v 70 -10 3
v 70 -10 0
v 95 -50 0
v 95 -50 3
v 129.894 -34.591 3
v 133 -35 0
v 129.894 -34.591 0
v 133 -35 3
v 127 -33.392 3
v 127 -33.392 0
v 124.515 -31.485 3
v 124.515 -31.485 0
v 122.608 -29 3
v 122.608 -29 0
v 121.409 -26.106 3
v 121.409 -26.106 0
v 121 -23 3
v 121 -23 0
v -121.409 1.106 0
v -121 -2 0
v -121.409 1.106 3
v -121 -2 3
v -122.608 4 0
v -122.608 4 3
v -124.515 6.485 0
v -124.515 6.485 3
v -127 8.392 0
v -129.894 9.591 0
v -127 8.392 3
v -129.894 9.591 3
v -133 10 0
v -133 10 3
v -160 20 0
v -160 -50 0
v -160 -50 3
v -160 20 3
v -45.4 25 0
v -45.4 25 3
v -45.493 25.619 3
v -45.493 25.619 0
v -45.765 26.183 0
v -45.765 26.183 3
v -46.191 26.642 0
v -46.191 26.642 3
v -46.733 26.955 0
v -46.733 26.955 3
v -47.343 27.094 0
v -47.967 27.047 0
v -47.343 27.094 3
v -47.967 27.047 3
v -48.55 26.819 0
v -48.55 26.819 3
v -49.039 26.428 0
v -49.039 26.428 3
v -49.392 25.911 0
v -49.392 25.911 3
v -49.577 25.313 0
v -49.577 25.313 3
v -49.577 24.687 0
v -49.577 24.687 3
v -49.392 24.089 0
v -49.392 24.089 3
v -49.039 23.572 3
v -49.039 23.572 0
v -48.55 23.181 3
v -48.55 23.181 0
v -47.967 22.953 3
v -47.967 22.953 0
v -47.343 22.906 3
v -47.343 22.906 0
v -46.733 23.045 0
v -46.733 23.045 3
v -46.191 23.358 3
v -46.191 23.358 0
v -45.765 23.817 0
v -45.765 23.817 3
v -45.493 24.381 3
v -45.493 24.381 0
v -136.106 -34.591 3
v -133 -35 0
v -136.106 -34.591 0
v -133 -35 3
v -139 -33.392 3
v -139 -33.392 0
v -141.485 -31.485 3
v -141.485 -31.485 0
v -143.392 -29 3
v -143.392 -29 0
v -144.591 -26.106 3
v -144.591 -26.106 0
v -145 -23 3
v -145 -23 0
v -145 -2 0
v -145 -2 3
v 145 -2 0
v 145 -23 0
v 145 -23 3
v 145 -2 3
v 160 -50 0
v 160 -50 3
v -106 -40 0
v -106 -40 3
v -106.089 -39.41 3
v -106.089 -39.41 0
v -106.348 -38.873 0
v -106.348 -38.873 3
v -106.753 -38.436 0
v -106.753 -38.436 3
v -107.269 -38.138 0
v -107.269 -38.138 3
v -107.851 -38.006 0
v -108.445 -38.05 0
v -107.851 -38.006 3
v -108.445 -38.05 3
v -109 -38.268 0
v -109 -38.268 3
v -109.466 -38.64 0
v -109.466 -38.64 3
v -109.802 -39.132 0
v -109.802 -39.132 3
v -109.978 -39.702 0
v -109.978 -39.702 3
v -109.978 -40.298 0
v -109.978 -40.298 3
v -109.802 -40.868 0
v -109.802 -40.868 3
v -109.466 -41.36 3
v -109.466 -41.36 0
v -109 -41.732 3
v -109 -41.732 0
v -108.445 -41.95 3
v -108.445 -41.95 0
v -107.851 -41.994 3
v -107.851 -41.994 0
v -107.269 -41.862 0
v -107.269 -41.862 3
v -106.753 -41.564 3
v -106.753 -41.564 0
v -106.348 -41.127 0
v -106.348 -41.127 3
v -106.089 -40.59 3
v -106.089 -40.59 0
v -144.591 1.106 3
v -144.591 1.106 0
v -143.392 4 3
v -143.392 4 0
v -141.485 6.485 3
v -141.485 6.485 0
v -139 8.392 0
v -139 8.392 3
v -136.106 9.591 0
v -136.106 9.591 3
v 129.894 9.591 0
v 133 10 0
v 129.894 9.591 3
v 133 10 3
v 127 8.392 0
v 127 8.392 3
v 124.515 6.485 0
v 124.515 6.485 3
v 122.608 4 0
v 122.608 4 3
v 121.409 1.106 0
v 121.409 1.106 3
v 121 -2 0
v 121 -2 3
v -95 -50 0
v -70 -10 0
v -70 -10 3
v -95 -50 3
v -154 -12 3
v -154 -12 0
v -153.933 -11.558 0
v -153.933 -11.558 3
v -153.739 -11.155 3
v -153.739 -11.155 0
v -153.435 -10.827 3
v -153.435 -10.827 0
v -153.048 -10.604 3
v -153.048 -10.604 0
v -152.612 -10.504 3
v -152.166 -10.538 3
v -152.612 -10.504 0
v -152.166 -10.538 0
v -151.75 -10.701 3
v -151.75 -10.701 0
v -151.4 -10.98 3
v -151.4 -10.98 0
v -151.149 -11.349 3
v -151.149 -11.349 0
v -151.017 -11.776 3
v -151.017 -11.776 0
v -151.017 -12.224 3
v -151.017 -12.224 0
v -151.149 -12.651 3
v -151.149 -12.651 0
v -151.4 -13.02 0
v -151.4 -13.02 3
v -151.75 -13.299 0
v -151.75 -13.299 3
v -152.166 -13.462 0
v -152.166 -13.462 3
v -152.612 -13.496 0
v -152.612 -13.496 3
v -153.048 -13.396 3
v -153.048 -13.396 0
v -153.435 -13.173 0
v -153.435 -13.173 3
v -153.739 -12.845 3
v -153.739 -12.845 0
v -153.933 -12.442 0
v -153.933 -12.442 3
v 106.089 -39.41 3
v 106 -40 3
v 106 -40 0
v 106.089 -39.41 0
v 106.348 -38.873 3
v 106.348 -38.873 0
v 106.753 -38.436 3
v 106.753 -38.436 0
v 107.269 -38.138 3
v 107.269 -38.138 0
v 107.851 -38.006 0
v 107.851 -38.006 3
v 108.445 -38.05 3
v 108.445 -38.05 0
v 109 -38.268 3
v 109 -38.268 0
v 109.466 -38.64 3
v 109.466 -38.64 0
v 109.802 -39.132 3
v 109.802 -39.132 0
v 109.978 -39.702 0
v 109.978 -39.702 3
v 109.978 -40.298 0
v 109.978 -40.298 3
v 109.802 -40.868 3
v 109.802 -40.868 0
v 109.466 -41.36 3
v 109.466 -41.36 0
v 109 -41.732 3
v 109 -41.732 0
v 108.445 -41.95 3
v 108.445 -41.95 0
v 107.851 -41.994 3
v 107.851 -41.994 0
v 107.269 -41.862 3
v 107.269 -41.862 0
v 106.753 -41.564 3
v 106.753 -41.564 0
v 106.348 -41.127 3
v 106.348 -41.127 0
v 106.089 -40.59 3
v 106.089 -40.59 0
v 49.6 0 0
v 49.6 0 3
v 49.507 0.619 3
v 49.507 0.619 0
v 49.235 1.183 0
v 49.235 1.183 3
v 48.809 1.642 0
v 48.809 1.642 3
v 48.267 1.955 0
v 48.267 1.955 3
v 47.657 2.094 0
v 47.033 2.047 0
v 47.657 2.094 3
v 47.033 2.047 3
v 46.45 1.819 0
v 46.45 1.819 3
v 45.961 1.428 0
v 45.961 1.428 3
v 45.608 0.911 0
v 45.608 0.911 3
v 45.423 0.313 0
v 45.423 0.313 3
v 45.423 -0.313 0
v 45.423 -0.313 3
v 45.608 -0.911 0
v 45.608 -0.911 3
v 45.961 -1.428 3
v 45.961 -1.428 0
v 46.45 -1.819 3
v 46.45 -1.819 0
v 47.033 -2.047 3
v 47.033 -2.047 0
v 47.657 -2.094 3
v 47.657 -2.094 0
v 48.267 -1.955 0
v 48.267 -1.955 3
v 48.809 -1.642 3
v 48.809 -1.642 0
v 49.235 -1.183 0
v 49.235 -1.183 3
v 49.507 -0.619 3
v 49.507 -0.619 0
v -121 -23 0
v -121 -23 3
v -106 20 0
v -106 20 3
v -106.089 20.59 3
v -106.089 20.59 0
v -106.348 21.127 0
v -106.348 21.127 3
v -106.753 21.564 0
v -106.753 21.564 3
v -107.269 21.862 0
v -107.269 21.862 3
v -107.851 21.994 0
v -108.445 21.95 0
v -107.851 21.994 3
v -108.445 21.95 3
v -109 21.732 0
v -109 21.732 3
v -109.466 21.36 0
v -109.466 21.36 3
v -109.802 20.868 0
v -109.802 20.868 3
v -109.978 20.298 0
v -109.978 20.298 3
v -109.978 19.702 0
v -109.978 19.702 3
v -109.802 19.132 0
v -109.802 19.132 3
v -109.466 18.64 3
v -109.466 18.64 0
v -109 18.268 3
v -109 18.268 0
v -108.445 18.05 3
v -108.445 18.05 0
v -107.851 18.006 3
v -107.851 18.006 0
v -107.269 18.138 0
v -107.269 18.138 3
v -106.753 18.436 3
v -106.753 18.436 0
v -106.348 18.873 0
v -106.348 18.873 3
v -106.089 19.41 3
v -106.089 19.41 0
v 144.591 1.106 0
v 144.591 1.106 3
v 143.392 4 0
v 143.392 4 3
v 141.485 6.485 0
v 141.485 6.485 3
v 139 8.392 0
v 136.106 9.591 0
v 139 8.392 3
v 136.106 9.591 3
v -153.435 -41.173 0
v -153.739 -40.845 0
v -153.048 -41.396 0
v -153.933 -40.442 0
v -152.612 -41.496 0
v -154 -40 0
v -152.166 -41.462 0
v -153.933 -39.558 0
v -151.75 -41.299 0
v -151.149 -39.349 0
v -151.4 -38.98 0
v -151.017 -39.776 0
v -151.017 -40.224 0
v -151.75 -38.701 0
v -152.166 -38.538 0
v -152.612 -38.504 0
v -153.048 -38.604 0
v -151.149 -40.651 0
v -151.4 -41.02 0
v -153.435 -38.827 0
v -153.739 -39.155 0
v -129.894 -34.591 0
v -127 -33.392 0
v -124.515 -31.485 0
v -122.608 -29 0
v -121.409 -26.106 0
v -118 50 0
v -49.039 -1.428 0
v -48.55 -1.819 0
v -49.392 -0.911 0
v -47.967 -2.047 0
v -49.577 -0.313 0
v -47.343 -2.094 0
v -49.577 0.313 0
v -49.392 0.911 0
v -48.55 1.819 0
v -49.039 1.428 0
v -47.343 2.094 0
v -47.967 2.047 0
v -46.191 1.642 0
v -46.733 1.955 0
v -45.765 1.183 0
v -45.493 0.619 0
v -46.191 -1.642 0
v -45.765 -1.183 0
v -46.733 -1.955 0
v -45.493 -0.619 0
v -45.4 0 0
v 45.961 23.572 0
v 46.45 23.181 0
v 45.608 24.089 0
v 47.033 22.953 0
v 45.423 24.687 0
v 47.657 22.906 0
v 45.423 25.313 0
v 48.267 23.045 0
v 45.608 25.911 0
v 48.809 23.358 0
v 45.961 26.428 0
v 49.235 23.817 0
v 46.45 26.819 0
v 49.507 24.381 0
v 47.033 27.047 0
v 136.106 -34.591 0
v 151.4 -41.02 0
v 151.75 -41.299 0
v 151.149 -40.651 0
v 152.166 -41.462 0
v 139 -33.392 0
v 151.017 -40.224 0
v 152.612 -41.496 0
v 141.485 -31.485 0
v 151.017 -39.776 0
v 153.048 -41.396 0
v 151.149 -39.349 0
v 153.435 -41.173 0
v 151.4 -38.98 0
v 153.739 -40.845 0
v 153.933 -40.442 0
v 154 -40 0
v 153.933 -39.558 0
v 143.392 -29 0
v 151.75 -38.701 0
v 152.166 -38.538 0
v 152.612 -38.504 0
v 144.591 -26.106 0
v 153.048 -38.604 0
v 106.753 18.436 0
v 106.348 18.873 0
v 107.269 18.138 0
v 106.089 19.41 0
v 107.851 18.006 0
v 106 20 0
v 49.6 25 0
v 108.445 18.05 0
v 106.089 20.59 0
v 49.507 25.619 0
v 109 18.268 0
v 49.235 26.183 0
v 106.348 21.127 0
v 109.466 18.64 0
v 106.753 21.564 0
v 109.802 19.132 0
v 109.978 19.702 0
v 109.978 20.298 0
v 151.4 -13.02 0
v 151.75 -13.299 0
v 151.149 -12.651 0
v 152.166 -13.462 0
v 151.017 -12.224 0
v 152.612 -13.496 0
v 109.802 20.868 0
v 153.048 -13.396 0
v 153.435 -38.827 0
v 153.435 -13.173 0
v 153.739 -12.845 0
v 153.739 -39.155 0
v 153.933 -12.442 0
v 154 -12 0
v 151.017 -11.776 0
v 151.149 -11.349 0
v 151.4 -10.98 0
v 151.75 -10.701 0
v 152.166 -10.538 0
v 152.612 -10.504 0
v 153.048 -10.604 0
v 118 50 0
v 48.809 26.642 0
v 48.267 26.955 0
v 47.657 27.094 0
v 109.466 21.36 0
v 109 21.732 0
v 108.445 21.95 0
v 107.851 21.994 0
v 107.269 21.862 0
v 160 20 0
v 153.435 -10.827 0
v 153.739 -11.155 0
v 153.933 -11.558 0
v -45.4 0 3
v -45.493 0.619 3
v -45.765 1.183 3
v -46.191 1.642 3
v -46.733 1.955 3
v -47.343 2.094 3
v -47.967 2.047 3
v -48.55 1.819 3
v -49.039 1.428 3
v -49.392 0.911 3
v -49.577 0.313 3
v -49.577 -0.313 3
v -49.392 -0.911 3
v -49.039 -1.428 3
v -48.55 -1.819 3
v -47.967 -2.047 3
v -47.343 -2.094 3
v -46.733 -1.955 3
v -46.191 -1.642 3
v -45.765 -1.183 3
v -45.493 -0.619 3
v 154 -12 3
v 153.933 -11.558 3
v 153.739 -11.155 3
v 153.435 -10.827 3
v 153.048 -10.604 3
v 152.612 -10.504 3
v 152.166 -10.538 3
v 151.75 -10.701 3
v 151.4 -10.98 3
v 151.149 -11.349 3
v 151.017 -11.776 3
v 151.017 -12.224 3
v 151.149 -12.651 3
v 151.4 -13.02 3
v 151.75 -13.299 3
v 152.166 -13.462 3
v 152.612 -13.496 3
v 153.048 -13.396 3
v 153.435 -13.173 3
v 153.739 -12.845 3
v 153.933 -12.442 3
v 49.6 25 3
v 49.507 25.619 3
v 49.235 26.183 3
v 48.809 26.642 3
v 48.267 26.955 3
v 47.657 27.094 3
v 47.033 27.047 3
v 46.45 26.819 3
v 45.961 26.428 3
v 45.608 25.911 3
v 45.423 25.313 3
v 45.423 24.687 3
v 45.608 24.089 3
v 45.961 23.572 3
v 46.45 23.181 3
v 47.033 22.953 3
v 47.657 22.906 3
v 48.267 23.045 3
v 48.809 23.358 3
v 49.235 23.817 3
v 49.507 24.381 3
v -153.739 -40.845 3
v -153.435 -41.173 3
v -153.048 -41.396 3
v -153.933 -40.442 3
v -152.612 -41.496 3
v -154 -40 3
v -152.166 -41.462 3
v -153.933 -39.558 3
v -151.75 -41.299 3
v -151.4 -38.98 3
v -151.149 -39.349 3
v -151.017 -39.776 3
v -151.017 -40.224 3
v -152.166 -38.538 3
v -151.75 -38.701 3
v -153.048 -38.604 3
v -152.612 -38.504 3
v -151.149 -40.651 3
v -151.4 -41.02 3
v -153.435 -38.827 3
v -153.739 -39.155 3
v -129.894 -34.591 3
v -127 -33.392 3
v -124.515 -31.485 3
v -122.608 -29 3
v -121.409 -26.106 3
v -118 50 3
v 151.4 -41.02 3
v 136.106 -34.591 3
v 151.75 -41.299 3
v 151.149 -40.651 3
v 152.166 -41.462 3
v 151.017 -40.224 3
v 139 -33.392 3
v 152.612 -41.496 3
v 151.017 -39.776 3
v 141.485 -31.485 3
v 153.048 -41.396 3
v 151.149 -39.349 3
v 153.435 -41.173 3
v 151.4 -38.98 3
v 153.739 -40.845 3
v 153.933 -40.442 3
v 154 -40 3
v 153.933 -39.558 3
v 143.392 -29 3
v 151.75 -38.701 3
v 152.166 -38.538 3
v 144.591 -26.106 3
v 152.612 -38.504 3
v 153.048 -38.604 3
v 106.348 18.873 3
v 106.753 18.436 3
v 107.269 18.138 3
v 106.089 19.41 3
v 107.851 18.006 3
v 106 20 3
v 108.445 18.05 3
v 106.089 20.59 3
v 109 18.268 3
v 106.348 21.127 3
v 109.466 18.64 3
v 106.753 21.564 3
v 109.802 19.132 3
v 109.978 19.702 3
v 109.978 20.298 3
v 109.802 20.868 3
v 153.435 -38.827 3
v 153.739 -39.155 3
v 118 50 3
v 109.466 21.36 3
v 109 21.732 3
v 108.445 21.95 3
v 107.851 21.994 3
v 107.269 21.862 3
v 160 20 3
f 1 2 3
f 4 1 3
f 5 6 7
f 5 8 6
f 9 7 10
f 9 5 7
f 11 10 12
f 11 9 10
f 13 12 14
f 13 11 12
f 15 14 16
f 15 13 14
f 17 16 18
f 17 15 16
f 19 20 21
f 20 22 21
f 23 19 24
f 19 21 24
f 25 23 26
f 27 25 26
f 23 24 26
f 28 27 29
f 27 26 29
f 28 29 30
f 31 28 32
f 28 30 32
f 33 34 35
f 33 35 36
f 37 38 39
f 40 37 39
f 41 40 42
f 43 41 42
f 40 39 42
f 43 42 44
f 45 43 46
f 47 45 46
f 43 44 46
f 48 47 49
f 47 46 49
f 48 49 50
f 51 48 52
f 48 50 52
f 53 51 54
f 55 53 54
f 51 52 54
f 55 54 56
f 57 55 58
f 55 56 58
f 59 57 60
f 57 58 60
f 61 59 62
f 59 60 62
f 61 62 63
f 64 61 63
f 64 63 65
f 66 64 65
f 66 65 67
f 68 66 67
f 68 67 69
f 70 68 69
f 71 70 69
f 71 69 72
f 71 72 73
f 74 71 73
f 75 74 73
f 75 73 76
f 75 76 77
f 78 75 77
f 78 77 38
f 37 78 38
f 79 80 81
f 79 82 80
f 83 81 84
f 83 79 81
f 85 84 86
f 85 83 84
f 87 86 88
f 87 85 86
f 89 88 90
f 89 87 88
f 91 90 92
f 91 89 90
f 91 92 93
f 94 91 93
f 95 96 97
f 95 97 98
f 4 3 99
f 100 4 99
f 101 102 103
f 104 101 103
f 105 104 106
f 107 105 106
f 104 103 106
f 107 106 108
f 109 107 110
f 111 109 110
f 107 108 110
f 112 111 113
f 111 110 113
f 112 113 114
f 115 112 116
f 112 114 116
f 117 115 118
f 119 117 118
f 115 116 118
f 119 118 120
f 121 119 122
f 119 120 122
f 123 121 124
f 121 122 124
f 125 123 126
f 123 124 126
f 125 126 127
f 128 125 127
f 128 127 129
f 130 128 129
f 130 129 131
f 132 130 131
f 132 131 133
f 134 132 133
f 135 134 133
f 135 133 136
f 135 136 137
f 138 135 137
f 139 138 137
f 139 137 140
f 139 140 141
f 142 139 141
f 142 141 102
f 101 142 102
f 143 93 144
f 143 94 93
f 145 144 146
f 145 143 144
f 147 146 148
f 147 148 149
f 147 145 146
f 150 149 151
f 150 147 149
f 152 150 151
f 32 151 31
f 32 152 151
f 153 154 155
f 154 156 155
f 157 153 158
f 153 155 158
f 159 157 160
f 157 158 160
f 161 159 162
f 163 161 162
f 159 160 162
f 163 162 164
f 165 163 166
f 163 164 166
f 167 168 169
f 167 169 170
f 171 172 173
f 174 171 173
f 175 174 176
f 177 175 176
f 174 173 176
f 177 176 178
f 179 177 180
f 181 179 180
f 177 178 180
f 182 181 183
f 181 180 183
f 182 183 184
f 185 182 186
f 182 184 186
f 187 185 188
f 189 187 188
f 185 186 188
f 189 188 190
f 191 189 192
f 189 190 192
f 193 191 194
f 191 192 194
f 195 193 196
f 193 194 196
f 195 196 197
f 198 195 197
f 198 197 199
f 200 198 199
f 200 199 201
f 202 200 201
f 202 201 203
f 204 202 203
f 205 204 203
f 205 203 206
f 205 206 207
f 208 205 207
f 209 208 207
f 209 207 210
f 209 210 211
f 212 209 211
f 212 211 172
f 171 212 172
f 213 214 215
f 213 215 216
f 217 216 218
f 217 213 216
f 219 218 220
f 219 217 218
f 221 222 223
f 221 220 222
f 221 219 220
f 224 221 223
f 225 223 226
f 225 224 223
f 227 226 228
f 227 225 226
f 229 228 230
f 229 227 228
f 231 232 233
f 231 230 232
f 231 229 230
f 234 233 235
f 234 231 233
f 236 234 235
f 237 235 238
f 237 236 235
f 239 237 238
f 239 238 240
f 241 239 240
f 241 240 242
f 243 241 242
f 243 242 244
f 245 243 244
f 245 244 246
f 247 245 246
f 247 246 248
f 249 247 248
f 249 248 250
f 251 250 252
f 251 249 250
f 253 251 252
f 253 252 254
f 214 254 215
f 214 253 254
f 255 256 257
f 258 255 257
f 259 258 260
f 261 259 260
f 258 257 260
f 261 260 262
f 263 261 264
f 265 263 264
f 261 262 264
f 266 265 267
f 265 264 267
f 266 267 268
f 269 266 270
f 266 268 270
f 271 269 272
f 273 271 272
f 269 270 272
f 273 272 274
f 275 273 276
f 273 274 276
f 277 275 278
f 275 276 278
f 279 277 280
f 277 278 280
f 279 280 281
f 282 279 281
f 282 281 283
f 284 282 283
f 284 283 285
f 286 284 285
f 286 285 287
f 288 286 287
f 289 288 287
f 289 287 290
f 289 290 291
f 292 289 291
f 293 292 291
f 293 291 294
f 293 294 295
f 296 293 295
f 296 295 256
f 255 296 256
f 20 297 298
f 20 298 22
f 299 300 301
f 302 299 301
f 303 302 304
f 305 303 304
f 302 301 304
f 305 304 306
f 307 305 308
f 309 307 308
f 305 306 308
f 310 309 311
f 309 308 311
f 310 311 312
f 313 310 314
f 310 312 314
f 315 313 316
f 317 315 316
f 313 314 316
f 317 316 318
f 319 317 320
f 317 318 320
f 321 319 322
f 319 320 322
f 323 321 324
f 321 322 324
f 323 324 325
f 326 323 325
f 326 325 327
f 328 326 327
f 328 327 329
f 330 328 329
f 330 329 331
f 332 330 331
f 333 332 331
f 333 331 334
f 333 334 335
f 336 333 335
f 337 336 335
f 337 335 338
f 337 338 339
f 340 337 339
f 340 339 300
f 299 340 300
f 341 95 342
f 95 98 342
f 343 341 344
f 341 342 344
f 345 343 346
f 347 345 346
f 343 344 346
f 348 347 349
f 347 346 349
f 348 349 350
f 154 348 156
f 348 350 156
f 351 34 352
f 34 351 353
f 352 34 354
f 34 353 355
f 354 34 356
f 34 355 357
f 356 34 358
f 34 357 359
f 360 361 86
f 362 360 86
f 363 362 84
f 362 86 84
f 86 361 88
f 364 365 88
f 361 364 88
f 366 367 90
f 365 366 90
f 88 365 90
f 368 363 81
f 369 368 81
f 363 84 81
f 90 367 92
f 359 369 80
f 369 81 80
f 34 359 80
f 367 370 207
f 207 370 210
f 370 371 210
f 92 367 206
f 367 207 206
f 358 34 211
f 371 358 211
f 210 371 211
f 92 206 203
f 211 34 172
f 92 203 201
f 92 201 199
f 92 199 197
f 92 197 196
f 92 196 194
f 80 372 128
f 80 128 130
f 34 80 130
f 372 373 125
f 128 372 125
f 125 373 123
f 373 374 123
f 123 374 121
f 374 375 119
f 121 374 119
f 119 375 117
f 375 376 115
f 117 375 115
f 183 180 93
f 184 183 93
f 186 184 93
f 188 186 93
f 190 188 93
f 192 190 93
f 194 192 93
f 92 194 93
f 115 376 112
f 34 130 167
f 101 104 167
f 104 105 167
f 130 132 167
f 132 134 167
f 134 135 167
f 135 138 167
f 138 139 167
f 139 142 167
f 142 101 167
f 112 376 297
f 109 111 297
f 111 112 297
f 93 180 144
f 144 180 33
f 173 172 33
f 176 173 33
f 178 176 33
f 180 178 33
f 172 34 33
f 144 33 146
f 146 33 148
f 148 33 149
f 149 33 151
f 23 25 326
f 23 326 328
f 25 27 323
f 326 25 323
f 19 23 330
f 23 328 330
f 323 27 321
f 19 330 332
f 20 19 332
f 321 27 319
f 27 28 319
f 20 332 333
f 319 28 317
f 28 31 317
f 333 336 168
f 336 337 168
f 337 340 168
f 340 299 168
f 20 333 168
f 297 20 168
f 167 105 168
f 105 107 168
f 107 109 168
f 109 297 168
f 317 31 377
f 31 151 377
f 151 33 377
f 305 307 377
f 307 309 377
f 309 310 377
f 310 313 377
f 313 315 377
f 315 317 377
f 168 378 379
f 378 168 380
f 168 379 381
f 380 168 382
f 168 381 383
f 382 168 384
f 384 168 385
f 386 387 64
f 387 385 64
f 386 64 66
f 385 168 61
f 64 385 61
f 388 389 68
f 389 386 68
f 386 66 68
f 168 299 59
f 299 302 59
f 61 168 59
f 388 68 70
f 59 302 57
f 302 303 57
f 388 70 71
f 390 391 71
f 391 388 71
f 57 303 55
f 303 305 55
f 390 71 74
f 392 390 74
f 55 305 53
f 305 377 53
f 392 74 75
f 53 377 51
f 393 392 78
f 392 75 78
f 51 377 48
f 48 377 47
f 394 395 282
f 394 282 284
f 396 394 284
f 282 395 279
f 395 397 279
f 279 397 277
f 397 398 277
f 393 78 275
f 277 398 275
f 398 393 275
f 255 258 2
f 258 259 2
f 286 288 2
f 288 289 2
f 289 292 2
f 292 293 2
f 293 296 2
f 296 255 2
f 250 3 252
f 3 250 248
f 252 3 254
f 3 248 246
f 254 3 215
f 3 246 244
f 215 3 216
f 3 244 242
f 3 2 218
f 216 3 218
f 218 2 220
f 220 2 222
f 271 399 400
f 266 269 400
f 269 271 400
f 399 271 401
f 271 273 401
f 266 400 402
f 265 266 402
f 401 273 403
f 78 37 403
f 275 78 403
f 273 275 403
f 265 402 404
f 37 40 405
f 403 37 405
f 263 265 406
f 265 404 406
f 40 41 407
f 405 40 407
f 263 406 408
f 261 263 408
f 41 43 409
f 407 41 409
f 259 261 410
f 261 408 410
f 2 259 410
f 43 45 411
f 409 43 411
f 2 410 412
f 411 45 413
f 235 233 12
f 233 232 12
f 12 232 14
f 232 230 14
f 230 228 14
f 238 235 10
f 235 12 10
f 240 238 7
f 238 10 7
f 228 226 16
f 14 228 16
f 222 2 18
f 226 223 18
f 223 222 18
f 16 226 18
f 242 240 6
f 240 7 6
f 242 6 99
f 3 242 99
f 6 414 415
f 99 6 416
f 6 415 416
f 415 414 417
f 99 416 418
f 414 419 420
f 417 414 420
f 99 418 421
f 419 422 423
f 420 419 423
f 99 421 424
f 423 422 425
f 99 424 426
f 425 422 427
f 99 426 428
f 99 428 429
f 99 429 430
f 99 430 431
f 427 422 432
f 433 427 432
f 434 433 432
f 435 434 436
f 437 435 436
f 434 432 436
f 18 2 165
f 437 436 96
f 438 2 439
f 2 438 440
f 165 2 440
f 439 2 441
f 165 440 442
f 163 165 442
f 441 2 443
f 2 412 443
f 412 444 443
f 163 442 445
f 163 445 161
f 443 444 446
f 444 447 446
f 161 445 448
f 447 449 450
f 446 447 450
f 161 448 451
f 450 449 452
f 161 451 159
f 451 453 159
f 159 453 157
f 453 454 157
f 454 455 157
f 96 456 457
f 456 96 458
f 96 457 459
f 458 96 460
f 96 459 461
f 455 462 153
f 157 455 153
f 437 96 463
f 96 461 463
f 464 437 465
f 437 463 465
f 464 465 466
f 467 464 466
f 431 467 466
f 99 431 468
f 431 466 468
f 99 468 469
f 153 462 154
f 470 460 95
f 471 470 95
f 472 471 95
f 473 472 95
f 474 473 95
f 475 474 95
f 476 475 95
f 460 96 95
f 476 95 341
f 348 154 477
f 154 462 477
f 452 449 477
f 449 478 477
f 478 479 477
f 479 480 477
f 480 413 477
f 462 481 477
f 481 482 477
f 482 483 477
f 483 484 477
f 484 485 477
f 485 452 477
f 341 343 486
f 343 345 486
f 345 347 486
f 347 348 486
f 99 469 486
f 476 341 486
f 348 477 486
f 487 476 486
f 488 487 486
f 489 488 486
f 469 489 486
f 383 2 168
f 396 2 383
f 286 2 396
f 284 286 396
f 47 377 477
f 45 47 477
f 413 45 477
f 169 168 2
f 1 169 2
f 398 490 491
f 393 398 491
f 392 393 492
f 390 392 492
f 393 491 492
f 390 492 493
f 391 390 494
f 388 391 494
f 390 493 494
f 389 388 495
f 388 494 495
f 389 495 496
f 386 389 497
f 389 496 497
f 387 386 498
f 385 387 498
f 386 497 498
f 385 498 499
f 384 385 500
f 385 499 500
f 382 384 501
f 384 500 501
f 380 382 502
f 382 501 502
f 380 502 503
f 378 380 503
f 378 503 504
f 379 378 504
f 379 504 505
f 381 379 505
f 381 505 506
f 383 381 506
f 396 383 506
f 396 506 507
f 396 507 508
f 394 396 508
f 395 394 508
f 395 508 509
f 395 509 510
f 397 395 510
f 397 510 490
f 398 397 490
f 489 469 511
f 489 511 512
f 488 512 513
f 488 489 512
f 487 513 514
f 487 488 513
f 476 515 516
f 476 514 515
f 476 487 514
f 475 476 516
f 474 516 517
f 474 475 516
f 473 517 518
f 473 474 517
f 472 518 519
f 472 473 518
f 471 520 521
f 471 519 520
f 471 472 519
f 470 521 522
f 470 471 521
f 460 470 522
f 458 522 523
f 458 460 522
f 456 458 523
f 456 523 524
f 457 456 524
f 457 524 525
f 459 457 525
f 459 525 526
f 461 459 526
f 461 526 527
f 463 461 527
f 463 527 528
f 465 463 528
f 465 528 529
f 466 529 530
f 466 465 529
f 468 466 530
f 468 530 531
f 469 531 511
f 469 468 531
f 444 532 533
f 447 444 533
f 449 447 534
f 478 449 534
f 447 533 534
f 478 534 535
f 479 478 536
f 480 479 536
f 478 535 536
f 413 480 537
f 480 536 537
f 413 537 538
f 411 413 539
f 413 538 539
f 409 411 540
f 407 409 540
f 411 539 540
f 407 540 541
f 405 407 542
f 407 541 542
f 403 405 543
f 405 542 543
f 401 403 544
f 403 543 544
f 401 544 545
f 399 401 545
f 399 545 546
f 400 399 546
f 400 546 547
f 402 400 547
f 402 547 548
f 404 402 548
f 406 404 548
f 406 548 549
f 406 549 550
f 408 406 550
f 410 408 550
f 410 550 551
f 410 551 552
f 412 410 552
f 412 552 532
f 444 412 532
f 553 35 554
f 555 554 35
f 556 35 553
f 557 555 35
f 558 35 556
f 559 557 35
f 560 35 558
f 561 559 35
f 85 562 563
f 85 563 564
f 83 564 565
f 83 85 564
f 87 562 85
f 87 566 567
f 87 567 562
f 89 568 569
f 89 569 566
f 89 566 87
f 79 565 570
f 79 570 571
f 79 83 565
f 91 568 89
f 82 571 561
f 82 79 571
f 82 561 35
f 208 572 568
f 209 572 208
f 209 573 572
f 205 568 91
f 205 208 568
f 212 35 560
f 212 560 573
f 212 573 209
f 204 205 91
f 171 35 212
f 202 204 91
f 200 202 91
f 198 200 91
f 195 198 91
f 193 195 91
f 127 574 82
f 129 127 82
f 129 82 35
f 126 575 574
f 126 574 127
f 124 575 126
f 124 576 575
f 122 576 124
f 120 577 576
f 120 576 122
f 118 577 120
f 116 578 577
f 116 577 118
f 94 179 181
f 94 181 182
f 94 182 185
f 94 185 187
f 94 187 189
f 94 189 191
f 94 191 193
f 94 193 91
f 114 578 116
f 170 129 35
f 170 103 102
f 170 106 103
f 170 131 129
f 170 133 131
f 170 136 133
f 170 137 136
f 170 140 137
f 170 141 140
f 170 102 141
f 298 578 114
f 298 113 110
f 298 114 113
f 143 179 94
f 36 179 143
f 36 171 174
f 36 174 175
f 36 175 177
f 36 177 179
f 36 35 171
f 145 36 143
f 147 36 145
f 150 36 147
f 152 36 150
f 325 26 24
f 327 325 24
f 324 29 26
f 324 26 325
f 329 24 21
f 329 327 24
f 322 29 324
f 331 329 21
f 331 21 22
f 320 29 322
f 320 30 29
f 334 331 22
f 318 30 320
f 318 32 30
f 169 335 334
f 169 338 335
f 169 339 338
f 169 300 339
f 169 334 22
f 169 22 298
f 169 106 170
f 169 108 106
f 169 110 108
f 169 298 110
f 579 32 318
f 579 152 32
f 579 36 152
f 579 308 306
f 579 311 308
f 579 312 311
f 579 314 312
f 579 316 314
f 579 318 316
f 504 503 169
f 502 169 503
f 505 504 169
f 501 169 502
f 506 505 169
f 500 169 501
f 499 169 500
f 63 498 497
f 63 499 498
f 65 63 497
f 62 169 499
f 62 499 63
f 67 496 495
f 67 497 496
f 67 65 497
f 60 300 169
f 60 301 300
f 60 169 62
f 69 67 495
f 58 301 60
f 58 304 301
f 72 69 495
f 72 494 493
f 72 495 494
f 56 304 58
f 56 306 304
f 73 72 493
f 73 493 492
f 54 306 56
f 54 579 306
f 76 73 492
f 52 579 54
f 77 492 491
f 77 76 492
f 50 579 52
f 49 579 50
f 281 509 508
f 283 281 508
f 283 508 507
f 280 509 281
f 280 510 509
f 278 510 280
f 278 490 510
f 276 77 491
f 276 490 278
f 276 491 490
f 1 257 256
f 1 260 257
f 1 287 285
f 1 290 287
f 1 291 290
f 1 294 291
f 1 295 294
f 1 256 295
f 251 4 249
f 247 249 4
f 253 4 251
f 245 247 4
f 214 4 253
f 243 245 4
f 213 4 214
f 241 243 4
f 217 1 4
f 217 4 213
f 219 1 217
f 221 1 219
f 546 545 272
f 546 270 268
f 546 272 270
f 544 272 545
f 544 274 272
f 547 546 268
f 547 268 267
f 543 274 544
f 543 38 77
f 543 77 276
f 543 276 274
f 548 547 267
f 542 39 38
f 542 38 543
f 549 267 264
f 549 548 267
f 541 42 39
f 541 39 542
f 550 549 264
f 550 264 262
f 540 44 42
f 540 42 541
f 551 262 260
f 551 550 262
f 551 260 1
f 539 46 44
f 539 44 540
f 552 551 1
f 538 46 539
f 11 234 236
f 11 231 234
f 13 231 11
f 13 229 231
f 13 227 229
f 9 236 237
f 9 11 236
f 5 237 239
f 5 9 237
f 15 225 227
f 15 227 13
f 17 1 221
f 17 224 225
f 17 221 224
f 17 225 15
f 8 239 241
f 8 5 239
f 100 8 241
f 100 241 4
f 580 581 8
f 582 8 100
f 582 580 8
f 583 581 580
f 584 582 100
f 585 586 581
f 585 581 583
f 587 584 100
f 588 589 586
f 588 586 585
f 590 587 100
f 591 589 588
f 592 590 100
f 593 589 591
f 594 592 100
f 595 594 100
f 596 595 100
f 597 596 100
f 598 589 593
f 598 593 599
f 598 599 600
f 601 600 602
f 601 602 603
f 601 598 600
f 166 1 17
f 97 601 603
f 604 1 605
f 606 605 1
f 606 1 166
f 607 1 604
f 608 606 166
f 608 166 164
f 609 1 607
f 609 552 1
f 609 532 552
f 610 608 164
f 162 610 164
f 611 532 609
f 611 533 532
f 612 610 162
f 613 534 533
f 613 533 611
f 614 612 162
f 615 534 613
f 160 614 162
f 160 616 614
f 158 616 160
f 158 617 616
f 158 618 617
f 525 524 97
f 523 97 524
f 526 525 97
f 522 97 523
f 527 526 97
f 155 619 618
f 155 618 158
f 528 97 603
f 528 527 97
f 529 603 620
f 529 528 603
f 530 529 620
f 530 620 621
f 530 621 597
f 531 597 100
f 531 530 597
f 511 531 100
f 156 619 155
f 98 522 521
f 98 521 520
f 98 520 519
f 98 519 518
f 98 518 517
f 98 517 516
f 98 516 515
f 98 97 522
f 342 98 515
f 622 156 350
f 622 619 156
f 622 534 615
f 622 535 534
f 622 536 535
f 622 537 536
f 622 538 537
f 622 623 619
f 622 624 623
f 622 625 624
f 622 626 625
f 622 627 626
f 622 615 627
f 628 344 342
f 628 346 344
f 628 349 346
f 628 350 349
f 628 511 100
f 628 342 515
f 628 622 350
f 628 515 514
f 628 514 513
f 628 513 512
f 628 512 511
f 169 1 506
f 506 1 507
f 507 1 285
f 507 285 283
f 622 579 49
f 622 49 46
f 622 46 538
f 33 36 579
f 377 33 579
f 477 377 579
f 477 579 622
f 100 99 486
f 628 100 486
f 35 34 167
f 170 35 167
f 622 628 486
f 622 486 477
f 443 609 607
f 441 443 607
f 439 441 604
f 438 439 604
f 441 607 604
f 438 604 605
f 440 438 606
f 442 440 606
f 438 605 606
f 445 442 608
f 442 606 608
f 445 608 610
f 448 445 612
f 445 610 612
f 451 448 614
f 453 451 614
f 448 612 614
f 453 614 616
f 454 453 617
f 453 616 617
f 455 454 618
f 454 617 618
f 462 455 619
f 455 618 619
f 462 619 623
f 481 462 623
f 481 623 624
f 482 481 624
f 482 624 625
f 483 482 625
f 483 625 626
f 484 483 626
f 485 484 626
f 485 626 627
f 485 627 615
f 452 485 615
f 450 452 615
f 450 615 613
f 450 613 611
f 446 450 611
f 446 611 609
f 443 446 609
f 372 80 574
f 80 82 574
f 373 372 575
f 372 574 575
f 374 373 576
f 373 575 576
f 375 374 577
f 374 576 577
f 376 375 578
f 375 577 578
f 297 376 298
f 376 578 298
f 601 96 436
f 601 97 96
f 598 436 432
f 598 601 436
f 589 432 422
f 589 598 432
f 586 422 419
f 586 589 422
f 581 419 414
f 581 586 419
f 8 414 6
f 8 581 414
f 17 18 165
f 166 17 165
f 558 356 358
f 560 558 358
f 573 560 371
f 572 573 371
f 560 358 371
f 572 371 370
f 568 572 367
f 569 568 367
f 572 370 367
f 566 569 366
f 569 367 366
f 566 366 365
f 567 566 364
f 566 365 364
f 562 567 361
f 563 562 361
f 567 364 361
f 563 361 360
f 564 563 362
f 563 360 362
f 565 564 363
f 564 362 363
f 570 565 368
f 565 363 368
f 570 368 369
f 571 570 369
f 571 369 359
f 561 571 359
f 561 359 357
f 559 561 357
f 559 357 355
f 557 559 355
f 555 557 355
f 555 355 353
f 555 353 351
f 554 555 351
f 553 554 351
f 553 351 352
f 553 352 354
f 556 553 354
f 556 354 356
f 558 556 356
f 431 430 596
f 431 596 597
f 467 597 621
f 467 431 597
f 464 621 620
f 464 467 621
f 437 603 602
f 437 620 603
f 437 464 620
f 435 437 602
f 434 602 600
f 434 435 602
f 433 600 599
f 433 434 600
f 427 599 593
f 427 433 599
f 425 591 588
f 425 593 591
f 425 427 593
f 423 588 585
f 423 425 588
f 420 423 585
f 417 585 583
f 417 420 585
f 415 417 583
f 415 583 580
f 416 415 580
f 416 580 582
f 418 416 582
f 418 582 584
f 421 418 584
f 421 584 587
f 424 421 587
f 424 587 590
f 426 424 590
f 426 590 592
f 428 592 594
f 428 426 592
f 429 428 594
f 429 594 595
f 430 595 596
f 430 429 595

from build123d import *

# Parameters (mm, degrees)
SKETCH_1_W                  = 320
SKETCH_1_H                  = 100
EXTRUDE_1_DEPTH             = 3
HOLE_WIZARD_4_0_4_1_D       = 4
HOLE_WIZARD_4_2_4_2_1_D     = 4.2
PATTERN_LINEAR_1_COUNT      = 2
PATTERN_LINEAR_1_PITCH      = 95
PATTERN_LINEAR_1_COUNT_DIR2 = 2
PATTERN_LINEAR_1_PITCH_DIR2 = 25
CUT_EXTRUDE_1_DEPTH         = 3
SKETCH_8_W                  = 24
SKETCH_8_H                  = 45
CUT_EXTRUDE_6_DEPTH         = 3
PATTERN_LINEAR_2_COUNT      = 2
PATTERN_LINEAR_2_PITCH      = 60
PATTERN_LINEAR_2_COPY_1_D   = 4
HOLE_WIZARD_3_0_3_1_D       = 3
CUT_EXTRUDE_8_DEPTH         = 3
FILLET_1_R                  = 12


with BuildPart() as part:
    # 草图1 → 凸台-拉伸1 (new body)
    with BuildSketch(Plane.XY):
        Rectangle(SKETCH_1_W, SKETCH_1_H)
    extrude(amount=EXTRUDE_1_DEPTH)

    # Ø4.0 (4) 直径孔1 (through all)
    with Locations(Plane(origin=(0, 0, 0), x_dir=(-1, 0, 0), z_dir=(0, 0, -1))):
        with Locations((108, -40)):
            hole_wizard_4_0_4_1 = Hole(HOLE_WIZARD_4_0_4_1_D / 2)

    # 镜向1: Ø4.0 (4) 直径孔1 across plane
    add(hole_wizard_4_0_4_1.mirror(Plane(origin=(0, 0, 0), x_dir=(0, 0, 1), z_dir=(1, 0, 0))), mode=Mode.SUBTRACT)

    # Ø4.2 (4.2) 直径孔1 (through all)
    with Locations(Plane(origin=(0, 0, 0), x_dir=(-1, 0, 0), z_dir=(0, 0, -1))):
        with Locations((47.5, 0)):
            hole_wizard_4_2_4_2_1 = Hole(HOLE_WIZARD_4_2_4_2_1_D / 2)

    # 阵列(线性)1: Hole Wizard 4.2 _4.2_ _1 2 × 2
    with Locations(*[(i * PATTERN_LINEAR_1_PITCH, j * PATTERN_LINEAR_1_PITCH_DIR2, 0) for i in range(PATTERN_LINEAR_1_COUNT) for j in range(PATTERN_LINEAR_1_COUNT_DIR2) if (i, j) != (0, 0)]):
        add(hole_wizard_4_2_4_2_1, mode=Mode.SUBTRACT)

    # 草图6 → 切除-拉伸1 (cut)
    with BuildSketch(Plane(origin=(0, 0, 0), x_dir=(-1, 0, 0), z_dir=(0, 0, -1))):
        Polygon((0, -50), (0, -10), (70, -10), (95, -50), align=None)
    cut_extrude_1 = extrude(amount=-CUT_EXTRUDE_1_DEPTH, mode=Mode.SUBTRACT)

    # 镜向2: 切除-拉伸1 across plane
    add(cut_extrude_1.mirror(Plane(origin=(0, -50, 3), x_dir=(0, 0, 1), z_dir=(1, 0, 0))), mode=Mode.SUBTRACT)

    # 草图8 → 切除-拉伸6 (cut)
    with BuildSketch(Plane(origin=(0, 0, 0), x_dir=(-1, 0, 0), z_dir=(0, 0, -1))):
        with Locations((-133, -12.5)):
            Rectangle(SKETCH_8_W, SKETCH_8_H)
    cut_extrude_6 = extrude(amount=-CUT_EXTRUDE_6_DEPTH, mode=Mode.SUBTRACT)

    # 镜向4: 切除-拉伸6 across plane
    add(cut_extrude_6.mirror(Plane(origin=(0, 0, 0), x_dir=(0, 0, 1), z_dir=(1, 0, 0))), mode=Mode.SUBTRACT)

    # 阵列(线性)2: Ø4.0 (4) 直径孔1 ×2
    with Locations(*[(0, i * PATTERN_LINEAR_2_PITCH, 0) for i in range(1, PATTERN_LINEAR_2_COUNT)]):
        add(hole_wizard_4_0_4_1, mode=Mode.SUBTRACT)

    # 阵列(线性)2 copy 1 (through all)
    with Locations(Plane(origin=(0, 60, 0), x_dir=(1, 0, 0), z_dir=(0, 0, -1))):
        with Locations((108, 40)):
            Hole(PATTERN_LINEAR_2_COPY_1_D / 2)

    # Ø3.0 (3) 直径孔1 (through all)
    with Locations(Plane.XY.offset(3)):
        with Locations((-152.5, -40), (-152.5, -12)):
            hole_wizard_3_0_3_1 = Hole(HOLE_WIZARD_3_0_3_1_D / 2)

    # 草图11 → 切除-拉伸8 (cut)
    with BuildSketch(Plane.XY.offset(3)):
        Polygon((-118, 50), (-160, 50), (-160, 20), align=None)
    cut_extrude_8 = extrude(amount=-CUT_EXTRUDE_8_DEPTH, mode=Mode.SUBTRACT)

    # 镜向6: 切除-拉伸8 across plane
    add(cut_extrude_8.mirror(Plane(origin=(0, 0, 0), x_dir=(0, 0, 1), z_dir=(1, 0, 0))), mode=Mode.SUBTRACT)

    # 镜向7: Ø3.0 (3) 直径孔1 across plane
    add(hole_wizard_3_0_3_1.mirror(Plane(origin=(0, 0, 0), x_dir=(0, 0, 1), z_dir=(1, 0, 0))), mode=Mode.SUBTRACT)

    # 圆角1
    fillet_1_edges = [part.edges().sort_by_distance(p)[0] for p in [
        (145, -35, 1.5),
        (121, -35, 1.5),
        (145, 10, 1.5),
        (121, 10, 1.5),
        (-145, -35, 1.5),
        (-121, -35, 1.5),
        (-145, 10, 1.5),
        (-121, 10, 1.5),
    ]]
    fillet(fillet_1_edges, radius=FILLET_1_R - 0.0001)  # a hair under: the kernel refuses the full size


solid = part.part
